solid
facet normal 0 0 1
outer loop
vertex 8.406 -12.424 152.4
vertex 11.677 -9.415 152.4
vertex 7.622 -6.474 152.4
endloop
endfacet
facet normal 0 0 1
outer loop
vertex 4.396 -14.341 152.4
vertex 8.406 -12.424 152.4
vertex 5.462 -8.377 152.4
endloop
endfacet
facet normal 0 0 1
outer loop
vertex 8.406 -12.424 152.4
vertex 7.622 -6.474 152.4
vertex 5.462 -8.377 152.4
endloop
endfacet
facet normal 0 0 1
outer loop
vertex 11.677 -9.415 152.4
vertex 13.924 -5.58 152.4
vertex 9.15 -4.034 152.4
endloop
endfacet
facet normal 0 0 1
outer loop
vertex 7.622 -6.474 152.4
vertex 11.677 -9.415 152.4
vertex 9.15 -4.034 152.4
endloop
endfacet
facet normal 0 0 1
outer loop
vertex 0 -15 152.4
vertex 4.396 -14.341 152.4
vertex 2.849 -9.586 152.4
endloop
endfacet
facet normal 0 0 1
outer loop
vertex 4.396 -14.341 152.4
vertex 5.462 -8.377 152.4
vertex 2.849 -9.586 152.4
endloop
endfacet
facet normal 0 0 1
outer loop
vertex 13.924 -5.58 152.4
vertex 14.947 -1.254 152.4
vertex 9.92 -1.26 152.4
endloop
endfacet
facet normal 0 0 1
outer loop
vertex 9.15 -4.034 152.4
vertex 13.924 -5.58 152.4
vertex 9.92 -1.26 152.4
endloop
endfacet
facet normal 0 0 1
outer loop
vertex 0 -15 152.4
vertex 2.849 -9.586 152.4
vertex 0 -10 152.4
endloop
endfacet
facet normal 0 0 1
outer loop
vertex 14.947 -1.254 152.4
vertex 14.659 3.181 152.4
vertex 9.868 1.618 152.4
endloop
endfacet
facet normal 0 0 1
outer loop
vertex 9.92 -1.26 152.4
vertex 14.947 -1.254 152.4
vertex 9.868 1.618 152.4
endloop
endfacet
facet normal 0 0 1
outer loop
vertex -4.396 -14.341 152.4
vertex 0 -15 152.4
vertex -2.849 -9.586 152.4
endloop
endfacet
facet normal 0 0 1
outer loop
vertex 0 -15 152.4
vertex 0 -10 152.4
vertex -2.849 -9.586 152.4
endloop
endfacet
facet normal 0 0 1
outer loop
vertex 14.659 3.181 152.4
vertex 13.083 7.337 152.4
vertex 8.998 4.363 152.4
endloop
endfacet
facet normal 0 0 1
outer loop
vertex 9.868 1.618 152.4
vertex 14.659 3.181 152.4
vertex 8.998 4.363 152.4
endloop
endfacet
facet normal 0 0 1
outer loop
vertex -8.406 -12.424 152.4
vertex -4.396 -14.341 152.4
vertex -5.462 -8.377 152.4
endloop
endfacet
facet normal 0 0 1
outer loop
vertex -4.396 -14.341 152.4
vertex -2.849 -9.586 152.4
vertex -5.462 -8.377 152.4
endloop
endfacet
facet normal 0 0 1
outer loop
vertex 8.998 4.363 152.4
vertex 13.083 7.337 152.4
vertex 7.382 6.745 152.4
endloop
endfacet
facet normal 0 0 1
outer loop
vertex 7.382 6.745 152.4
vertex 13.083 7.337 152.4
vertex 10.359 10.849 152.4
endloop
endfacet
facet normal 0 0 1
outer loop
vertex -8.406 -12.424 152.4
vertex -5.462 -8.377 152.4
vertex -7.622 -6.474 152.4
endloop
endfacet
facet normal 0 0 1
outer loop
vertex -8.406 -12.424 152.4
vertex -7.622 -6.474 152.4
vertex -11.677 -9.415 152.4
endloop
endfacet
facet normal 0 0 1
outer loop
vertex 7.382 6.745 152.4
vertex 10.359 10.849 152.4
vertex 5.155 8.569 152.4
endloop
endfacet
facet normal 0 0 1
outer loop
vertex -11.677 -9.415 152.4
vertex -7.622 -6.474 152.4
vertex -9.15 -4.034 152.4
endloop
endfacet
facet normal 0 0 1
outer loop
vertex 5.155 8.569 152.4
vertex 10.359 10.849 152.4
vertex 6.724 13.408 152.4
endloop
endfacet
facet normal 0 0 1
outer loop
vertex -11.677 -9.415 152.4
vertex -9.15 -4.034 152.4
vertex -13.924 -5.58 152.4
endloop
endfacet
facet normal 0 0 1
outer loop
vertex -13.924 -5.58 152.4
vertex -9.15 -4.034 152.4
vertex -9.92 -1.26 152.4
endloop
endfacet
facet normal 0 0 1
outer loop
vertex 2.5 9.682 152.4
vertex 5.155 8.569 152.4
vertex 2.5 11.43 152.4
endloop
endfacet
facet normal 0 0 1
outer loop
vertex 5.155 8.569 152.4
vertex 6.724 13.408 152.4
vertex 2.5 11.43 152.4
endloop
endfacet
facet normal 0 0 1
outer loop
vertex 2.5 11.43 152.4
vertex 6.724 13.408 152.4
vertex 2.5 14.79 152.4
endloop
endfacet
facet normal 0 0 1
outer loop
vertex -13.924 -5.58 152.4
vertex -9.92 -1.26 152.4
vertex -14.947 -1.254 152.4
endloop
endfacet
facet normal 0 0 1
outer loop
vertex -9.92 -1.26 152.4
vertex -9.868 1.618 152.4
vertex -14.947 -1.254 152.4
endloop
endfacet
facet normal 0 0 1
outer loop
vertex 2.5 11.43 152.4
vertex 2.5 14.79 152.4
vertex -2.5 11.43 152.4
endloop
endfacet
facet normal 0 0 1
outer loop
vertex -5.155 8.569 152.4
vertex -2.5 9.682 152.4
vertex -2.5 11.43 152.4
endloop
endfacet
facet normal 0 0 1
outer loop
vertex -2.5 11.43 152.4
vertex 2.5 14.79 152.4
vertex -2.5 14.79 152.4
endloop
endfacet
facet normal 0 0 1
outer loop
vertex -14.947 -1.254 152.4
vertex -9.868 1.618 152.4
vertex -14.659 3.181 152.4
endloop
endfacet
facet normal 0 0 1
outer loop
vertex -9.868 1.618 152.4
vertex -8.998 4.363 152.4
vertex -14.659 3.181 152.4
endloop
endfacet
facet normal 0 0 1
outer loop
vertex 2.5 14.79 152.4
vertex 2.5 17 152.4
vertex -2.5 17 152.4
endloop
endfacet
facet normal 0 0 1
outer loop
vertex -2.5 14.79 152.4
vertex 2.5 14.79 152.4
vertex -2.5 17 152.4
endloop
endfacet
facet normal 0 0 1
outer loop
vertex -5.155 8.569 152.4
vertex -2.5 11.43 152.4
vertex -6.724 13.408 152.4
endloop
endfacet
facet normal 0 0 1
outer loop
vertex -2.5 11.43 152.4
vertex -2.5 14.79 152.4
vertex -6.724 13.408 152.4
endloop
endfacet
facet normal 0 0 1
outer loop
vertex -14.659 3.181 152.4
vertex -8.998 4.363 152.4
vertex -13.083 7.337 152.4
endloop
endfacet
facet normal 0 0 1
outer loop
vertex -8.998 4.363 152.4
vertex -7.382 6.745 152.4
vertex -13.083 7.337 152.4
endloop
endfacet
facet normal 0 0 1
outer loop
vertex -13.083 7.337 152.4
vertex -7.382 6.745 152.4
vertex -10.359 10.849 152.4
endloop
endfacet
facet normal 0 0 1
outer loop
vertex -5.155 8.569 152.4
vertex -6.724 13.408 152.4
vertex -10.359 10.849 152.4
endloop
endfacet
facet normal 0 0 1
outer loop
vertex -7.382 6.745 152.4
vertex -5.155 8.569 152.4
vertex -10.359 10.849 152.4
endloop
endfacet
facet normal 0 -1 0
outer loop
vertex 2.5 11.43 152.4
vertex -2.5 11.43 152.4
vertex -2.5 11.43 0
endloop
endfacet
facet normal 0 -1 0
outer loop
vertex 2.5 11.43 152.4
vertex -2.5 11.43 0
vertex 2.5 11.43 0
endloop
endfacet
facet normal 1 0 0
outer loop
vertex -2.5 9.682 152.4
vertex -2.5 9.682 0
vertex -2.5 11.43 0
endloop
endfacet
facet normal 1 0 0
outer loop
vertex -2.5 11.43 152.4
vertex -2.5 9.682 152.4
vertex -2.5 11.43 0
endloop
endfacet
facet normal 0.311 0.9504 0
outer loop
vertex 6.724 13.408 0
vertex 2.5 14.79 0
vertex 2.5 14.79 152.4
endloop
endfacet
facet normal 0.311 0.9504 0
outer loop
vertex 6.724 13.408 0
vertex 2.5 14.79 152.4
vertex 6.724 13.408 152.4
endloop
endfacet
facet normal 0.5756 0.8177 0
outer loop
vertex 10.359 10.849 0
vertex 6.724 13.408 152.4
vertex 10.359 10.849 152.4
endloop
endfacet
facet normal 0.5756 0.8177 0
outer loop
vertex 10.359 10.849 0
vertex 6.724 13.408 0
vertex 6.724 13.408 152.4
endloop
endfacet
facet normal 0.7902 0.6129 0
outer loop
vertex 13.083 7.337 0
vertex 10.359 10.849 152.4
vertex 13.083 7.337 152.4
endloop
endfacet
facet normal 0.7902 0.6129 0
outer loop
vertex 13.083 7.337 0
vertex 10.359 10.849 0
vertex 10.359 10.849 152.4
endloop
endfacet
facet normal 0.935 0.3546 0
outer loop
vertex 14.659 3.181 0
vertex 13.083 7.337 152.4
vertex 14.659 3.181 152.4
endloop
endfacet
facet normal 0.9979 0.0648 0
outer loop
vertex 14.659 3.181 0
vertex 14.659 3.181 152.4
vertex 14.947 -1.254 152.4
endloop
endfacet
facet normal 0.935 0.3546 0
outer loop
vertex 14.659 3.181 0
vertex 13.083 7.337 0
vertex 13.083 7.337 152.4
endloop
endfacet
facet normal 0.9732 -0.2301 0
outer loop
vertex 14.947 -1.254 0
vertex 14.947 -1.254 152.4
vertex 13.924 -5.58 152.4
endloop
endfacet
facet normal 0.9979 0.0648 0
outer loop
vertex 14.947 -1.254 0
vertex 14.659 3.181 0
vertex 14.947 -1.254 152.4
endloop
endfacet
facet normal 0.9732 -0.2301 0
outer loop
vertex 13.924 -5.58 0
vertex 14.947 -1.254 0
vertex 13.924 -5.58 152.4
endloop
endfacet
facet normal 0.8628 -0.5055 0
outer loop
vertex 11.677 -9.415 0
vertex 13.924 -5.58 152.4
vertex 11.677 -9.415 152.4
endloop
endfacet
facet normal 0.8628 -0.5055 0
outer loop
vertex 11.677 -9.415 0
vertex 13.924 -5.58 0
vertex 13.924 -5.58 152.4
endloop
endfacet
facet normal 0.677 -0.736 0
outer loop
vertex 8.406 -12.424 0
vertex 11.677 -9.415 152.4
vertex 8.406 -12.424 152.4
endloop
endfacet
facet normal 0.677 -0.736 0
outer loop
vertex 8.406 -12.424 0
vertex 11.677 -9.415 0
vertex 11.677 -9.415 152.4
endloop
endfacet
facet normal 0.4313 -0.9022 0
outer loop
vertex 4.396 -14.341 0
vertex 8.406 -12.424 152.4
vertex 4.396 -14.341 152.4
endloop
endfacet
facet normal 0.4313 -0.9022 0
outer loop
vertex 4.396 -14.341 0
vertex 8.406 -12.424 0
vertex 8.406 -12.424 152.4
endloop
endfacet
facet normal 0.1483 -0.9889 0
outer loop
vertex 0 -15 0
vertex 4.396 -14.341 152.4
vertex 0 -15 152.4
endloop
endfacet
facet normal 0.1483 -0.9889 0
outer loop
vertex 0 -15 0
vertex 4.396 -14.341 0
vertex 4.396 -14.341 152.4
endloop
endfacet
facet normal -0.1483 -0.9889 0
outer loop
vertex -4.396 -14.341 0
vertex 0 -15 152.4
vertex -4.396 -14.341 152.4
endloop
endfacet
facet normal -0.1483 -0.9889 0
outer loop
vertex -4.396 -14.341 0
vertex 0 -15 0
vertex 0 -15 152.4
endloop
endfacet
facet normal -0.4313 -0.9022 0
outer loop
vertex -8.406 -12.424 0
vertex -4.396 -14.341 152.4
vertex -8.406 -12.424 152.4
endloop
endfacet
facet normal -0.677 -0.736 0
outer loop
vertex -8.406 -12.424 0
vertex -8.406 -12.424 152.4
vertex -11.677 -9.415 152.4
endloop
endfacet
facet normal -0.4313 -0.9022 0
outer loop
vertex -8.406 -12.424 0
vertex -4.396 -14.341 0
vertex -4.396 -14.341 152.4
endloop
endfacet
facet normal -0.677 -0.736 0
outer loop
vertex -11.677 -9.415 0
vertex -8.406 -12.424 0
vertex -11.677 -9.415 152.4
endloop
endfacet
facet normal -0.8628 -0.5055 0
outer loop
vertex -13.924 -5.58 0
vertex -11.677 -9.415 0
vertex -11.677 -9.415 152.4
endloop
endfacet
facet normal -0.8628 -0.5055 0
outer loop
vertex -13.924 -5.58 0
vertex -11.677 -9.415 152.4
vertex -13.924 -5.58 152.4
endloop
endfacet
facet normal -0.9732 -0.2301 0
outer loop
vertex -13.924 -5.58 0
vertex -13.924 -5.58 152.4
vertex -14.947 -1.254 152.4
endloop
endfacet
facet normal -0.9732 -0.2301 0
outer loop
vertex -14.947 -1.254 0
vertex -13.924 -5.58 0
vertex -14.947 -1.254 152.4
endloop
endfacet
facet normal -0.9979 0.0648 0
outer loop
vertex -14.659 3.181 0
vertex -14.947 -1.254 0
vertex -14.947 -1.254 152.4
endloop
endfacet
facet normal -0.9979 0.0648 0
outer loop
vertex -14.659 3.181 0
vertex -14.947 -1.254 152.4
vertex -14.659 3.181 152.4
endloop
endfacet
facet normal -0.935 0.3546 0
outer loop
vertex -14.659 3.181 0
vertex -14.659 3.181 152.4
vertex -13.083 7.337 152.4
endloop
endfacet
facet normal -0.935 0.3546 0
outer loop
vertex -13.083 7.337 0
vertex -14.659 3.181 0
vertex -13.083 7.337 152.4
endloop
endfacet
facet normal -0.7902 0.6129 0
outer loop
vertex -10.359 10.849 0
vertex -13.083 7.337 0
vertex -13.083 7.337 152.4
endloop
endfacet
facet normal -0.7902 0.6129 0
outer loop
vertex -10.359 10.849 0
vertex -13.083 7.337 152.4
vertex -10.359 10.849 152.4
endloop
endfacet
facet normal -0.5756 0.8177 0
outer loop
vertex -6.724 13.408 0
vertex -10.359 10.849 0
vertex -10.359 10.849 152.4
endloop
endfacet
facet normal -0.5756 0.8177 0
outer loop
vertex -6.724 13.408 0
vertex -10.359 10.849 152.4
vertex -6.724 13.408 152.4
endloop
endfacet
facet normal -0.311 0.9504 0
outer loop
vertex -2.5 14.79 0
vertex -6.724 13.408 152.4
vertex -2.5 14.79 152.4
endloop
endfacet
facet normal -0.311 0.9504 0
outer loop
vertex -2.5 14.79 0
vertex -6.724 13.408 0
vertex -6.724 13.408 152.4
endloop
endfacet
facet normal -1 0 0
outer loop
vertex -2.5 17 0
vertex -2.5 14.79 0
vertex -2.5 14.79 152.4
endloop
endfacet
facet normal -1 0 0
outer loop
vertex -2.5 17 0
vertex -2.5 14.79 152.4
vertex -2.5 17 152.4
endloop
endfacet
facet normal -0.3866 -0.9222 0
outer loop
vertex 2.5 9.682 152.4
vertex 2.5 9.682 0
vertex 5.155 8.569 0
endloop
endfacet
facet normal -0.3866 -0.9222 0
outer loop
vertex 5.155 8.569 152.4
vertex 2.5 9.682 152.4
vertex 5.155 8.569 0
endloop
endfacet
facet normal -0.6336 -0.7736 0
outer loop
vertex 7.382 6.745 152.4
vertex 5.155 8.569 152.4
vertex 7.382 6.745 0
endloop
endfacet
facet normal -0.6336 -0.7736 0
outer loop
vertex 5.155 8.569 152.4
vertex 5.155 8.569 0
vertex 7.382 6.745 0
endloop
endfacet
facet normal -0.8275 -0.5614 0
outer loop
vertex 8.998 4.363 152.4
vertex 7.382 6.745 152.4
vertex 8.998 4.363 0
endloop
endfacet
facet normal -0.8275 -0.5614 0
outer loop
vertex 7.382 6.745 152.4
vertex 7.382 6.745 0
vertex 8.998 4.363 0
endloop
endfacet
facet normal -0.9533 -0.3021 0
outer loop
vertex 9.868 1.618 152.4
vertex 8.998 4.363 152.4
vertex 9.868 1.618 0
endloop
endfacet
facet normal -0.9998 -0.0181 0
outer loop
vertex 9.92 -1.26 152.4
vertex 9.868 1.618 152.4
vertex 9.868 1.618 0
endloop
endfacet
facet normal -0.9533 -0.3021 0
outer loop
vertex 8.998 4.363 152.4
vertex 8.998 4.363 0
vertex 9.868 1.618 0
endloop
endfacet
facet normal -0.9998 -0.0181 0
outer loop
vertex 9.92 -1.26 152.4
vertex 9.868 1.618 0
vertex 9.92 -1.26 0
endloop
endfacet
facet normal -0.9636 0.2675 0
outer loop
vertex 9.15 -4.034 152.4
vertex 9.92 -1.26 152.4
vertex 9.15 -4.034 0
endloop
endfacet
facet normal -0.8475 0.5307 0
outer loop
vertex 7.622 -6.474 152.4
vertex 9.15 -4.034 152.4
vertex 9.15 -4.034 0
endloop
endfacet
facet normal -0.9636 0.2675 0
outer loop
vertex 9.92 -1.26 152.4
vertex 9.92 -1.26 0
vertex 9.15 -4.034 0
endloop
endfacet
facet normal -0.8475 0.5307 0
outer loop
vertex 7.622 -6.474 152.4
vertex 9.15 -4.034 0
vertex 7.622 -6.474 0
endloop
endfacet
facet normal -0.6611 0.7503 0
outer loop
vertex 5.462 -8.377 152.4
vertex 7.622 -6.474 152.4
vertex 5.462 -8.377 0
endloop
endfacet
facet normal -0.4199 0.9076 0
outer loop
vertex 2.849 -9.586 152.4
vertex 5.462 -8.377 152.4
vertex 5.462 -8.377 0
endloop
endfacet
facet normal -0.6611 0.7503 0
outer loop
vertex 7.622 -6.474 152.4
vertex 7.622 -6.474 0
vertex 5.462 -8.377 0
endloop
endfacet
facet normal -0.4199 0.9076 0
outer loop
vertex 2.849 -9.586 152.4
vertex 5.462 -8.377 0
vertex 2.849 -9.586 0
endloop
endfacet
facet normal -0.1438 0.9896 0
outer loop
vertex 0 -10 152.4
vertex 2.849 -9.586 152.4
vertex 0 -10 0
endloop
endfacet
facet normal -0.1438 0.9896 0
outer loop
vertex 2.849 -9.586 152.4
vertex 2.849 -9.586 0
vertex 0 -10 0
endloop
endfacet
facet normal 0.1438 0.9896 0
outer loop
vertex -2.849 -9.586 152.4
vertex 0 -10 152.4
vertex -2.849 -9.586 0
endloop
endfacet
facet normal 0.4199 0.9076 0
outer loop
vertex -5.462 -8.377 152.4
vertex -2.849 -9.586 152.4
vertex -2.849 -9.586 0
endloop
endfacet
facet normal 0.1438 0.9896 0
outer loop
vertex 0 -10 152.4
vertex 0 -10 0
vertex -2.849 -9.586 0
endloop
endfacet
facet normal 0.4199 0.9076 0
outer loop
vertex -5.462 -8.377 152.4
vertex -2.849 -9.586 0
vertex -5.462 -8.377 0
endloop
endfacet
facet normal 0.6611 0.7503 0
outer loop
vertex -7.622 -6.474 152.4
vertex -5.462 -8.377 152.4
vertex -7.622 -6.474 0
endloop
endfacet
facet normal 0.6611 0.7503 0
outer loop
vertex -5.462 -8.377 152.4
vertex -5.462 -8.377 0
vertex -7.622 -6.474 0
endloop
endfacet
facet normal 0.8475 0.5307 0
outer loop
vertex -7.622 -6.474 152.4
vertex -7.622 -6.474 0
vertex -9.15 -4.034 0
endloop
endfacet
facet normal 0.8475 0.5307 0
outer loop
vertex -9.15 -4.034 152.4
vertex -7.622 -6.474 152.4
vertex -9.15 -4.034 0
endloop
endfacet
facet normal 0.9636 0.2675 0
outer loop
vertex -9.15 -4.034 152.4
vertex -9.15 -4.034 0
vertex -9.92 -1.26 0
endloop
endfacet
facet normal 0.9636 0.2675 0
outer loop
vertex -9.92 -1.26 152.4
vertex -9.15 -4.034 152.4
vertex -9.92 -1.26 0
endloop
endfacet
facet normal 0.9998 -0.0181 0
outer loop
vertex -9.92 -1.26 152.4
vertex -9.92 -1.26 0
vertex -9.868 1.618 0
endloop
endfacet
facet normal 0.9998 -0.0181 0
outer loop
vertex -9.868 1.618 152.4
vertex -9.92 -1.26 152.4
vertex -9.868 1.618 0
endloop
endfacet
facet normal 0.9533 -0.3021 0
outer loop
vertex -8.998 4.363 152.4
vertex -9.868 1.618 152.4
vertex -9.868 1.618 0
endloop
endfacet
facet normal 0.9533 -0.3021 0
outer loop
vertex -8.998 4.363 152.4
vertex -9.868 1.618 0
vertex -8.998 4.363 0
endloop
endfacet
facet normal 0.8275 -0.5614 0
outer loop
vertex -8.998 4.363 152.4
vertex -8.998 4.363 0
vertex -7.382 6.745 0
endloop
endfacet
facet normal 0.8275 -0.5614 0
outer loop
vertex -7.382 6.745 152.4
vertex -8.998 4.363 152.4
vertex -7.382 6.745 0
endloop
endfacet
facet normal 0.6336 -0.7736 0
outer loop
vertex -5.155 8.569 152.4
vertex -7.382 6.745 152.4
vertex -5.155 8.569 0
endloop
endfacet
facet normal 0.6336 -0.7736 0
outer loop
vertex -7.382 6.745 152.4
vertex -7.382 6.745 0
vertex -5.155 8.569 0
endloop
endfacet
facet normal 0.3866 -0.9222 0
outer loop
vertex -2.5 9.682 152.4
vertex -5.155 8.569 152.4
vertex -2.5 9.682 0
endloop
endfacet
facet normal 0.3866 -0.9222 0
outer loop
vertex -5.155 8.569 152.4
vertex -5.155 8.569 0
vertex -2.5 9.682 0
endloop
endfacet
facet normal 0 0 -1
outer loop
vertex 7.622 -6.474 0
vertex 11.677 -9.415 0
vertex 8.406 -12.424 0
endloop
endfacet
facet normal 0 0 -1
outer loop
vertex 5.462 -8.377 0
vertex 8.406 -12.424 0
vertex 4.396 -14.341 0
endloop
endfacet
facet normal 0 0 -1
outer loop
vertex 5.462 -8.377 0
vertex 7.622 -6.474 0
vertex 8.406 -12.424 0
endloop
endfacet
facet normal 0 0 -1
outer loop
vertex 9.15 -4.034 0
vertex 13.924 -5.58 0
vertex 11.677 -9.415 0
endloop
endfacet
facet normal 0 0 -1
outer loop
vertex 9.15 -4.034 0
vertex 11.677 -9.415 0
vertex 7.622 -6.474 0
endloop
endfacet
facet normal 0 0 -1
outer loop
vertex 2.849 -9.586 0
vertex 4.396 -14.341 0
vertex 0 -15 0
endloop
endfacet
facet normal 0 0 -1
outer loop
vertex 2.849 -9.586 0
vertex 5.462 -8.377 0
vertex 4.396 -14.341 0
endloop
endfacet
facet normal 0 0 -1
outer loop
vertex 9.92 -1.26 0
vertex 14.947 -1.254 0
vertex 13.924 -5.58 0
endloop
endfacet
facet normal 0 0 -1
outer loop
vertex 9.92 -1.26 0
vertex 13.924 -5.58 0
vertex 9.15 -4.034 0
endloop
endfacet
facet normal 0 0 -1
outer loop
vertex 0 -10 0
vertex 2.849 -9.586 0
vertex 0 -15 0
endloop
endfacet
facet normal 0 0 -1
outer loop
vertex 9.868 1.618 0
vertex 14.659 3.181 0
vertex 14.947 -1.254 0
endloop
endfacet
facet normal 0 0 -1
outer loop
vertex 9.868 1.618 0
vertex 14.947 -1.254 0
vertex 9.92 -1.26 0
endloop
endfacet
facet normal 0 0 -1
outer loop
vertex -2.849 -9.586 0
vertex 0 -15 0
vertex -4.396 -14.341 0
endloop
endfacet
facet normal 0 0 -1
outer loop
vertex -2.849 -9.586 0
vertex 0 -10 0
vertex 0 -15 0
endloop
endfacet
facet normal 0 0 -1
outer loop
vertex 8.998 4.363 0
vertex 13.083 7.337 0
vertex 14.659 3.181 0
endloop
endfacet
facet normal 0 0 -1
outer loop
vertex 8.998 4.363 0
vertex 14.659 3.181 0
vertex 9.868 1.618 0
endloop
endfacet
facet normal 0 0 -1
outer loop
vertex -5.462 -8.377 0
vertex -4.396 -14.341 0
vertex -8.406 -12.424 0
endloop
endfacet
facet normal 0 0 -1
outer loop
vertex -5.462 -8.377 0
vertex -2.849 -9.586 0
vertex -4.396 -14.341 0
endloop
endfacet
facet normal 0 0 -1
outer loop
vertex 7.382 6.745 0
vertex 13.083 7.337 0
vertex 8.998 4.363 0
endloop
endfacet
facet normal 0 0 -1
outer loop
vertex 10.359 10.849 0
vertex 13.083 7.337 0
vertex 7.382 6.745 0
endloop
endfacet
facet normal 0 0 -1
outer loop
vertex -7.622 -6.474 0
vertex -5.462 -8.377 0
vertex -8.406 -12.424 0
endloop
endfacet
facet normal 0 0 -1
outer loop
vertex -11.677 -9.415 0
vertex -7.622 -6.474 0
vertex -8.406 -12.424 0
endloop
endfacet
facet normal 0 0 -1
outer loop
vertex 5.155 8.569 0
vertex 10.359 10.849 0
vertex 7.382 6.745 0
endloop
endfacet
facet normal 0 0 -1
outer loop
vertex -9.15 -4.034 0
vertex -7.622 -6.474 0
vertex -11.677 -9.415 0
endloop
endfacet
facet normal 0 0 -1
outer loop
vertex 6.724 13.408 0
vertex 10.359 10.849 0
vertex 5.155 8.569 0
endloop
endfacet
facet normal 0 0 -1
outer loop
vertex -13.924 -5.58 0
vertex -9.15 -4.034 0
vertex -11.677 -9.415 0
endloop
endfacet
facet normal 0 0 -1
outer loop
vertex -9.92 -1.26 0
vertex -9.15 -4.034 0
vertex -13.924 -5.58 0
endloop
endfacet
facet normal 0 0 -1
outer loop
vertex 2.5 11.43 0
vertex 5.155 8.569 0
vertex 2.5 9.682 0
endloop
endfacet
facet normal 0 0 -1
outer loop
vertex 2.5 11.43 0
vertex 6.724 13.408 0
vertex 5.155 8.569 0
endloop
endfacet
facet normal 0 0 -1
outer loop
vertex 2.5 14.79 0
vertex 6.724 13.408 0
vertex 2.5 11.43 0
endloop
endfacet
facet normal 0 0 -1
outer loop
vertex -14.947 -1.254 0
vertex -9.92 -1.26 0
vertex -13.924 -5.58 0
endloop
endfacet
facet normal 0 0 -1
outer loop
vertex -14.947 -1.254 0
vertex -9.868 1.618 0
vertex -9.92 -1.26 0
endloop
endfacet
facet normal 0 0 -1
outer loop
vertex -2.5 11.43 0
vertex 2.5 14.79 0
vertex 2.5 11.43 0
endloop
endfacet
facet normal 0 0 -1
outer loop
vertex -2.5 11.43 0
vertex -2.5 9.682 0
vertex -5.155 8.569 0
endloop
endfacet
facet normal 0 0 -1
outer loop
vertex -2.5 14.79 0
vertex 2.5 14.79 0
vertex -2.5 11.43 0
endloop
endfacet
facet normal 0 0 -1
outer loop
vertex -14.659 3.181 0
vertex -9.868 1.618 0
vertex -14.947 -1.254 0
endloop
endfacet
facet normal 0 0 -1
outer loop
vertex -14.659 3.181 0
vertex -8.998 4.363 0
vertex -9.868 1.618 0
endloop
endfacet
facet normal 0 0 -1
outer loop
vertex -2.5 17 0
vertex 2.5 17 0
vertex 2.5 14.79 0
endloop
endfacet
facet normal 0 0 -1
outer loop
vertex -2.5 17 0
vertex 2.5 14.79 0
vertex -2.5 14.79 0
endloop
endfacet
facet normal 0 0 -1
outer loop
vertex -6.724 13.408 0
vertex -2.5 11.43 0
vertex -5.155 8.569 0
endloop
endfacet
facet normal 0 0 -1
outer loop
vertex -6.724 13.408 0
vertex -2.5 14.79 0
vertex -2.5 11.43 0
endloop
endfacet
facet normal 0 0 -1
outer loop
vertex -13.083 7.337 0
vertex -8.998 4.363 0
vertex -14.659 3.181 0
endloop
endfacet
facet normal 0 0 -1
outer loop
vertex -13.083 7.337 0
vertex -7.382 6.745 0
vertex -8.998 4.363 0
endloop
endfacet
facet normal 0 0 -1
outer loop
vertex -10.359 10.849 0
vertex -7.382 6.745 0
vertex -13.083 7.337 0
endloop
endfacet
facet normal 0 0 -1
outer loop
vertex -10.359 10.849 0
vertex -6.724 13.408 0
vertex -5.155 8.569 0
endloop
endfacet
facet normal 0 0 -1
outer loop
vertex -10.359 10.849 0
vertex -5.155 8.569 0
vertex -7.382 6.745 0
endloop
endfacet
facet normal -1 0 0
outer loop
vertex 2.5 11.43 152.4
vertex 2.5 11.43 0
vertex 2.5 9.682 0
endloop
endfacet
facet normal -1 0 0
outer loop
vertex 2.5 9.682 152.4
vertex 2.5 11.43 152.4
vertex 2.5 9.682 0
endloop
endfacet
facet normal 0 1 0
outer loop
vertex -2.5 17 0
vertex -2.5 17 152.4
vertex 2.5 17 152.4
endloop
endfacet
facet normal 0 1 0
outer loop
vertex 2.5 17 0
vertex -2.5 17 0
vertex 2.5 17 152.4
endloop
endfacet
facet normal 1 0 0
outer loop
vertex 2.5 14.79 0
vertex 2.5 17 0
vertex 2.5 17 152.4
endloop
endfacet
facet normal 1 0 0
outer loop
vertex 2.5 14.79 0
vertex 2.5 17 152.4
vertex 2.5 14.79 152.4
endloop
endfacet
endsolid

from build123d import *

# Parameters (mm, degrees)
BOSS_EXTRUDE1_DEPTH = 152.4


with BuildPart() as part:
    # Sketch1 → Boss-Extrude1 (new body)
    with BuildSketch(Plane.XY):
        with BuildLine():
            Line((-2.5, 14.790199458), (-2.5, 17))
            Line((-2.5, 17), (2.5, 17))
            Line((2.5, 17), (2.5, 14.790199458))
            ThreePointArc((2.5, 14.790199458), (0, -15), (-2.5, 14.790199458))
        make_face()
        with BuildLine():
            Line((-2.5, 9.682458366), (-2.5, 11.43))
            Line((-2.5, 11.43), (2.5, 11.43))
            Line((2.5, 11.43), (2.5, 9.682458366))
            ThreePointArc((2.5, 9.682458366), (0, -10), (-2.5, 9.682458366))
        make_face(mode=Mode.SUBTRACT)
    extrude(amount=BOSS_EXTRUDE1_DEPTH)


solid = part.part
